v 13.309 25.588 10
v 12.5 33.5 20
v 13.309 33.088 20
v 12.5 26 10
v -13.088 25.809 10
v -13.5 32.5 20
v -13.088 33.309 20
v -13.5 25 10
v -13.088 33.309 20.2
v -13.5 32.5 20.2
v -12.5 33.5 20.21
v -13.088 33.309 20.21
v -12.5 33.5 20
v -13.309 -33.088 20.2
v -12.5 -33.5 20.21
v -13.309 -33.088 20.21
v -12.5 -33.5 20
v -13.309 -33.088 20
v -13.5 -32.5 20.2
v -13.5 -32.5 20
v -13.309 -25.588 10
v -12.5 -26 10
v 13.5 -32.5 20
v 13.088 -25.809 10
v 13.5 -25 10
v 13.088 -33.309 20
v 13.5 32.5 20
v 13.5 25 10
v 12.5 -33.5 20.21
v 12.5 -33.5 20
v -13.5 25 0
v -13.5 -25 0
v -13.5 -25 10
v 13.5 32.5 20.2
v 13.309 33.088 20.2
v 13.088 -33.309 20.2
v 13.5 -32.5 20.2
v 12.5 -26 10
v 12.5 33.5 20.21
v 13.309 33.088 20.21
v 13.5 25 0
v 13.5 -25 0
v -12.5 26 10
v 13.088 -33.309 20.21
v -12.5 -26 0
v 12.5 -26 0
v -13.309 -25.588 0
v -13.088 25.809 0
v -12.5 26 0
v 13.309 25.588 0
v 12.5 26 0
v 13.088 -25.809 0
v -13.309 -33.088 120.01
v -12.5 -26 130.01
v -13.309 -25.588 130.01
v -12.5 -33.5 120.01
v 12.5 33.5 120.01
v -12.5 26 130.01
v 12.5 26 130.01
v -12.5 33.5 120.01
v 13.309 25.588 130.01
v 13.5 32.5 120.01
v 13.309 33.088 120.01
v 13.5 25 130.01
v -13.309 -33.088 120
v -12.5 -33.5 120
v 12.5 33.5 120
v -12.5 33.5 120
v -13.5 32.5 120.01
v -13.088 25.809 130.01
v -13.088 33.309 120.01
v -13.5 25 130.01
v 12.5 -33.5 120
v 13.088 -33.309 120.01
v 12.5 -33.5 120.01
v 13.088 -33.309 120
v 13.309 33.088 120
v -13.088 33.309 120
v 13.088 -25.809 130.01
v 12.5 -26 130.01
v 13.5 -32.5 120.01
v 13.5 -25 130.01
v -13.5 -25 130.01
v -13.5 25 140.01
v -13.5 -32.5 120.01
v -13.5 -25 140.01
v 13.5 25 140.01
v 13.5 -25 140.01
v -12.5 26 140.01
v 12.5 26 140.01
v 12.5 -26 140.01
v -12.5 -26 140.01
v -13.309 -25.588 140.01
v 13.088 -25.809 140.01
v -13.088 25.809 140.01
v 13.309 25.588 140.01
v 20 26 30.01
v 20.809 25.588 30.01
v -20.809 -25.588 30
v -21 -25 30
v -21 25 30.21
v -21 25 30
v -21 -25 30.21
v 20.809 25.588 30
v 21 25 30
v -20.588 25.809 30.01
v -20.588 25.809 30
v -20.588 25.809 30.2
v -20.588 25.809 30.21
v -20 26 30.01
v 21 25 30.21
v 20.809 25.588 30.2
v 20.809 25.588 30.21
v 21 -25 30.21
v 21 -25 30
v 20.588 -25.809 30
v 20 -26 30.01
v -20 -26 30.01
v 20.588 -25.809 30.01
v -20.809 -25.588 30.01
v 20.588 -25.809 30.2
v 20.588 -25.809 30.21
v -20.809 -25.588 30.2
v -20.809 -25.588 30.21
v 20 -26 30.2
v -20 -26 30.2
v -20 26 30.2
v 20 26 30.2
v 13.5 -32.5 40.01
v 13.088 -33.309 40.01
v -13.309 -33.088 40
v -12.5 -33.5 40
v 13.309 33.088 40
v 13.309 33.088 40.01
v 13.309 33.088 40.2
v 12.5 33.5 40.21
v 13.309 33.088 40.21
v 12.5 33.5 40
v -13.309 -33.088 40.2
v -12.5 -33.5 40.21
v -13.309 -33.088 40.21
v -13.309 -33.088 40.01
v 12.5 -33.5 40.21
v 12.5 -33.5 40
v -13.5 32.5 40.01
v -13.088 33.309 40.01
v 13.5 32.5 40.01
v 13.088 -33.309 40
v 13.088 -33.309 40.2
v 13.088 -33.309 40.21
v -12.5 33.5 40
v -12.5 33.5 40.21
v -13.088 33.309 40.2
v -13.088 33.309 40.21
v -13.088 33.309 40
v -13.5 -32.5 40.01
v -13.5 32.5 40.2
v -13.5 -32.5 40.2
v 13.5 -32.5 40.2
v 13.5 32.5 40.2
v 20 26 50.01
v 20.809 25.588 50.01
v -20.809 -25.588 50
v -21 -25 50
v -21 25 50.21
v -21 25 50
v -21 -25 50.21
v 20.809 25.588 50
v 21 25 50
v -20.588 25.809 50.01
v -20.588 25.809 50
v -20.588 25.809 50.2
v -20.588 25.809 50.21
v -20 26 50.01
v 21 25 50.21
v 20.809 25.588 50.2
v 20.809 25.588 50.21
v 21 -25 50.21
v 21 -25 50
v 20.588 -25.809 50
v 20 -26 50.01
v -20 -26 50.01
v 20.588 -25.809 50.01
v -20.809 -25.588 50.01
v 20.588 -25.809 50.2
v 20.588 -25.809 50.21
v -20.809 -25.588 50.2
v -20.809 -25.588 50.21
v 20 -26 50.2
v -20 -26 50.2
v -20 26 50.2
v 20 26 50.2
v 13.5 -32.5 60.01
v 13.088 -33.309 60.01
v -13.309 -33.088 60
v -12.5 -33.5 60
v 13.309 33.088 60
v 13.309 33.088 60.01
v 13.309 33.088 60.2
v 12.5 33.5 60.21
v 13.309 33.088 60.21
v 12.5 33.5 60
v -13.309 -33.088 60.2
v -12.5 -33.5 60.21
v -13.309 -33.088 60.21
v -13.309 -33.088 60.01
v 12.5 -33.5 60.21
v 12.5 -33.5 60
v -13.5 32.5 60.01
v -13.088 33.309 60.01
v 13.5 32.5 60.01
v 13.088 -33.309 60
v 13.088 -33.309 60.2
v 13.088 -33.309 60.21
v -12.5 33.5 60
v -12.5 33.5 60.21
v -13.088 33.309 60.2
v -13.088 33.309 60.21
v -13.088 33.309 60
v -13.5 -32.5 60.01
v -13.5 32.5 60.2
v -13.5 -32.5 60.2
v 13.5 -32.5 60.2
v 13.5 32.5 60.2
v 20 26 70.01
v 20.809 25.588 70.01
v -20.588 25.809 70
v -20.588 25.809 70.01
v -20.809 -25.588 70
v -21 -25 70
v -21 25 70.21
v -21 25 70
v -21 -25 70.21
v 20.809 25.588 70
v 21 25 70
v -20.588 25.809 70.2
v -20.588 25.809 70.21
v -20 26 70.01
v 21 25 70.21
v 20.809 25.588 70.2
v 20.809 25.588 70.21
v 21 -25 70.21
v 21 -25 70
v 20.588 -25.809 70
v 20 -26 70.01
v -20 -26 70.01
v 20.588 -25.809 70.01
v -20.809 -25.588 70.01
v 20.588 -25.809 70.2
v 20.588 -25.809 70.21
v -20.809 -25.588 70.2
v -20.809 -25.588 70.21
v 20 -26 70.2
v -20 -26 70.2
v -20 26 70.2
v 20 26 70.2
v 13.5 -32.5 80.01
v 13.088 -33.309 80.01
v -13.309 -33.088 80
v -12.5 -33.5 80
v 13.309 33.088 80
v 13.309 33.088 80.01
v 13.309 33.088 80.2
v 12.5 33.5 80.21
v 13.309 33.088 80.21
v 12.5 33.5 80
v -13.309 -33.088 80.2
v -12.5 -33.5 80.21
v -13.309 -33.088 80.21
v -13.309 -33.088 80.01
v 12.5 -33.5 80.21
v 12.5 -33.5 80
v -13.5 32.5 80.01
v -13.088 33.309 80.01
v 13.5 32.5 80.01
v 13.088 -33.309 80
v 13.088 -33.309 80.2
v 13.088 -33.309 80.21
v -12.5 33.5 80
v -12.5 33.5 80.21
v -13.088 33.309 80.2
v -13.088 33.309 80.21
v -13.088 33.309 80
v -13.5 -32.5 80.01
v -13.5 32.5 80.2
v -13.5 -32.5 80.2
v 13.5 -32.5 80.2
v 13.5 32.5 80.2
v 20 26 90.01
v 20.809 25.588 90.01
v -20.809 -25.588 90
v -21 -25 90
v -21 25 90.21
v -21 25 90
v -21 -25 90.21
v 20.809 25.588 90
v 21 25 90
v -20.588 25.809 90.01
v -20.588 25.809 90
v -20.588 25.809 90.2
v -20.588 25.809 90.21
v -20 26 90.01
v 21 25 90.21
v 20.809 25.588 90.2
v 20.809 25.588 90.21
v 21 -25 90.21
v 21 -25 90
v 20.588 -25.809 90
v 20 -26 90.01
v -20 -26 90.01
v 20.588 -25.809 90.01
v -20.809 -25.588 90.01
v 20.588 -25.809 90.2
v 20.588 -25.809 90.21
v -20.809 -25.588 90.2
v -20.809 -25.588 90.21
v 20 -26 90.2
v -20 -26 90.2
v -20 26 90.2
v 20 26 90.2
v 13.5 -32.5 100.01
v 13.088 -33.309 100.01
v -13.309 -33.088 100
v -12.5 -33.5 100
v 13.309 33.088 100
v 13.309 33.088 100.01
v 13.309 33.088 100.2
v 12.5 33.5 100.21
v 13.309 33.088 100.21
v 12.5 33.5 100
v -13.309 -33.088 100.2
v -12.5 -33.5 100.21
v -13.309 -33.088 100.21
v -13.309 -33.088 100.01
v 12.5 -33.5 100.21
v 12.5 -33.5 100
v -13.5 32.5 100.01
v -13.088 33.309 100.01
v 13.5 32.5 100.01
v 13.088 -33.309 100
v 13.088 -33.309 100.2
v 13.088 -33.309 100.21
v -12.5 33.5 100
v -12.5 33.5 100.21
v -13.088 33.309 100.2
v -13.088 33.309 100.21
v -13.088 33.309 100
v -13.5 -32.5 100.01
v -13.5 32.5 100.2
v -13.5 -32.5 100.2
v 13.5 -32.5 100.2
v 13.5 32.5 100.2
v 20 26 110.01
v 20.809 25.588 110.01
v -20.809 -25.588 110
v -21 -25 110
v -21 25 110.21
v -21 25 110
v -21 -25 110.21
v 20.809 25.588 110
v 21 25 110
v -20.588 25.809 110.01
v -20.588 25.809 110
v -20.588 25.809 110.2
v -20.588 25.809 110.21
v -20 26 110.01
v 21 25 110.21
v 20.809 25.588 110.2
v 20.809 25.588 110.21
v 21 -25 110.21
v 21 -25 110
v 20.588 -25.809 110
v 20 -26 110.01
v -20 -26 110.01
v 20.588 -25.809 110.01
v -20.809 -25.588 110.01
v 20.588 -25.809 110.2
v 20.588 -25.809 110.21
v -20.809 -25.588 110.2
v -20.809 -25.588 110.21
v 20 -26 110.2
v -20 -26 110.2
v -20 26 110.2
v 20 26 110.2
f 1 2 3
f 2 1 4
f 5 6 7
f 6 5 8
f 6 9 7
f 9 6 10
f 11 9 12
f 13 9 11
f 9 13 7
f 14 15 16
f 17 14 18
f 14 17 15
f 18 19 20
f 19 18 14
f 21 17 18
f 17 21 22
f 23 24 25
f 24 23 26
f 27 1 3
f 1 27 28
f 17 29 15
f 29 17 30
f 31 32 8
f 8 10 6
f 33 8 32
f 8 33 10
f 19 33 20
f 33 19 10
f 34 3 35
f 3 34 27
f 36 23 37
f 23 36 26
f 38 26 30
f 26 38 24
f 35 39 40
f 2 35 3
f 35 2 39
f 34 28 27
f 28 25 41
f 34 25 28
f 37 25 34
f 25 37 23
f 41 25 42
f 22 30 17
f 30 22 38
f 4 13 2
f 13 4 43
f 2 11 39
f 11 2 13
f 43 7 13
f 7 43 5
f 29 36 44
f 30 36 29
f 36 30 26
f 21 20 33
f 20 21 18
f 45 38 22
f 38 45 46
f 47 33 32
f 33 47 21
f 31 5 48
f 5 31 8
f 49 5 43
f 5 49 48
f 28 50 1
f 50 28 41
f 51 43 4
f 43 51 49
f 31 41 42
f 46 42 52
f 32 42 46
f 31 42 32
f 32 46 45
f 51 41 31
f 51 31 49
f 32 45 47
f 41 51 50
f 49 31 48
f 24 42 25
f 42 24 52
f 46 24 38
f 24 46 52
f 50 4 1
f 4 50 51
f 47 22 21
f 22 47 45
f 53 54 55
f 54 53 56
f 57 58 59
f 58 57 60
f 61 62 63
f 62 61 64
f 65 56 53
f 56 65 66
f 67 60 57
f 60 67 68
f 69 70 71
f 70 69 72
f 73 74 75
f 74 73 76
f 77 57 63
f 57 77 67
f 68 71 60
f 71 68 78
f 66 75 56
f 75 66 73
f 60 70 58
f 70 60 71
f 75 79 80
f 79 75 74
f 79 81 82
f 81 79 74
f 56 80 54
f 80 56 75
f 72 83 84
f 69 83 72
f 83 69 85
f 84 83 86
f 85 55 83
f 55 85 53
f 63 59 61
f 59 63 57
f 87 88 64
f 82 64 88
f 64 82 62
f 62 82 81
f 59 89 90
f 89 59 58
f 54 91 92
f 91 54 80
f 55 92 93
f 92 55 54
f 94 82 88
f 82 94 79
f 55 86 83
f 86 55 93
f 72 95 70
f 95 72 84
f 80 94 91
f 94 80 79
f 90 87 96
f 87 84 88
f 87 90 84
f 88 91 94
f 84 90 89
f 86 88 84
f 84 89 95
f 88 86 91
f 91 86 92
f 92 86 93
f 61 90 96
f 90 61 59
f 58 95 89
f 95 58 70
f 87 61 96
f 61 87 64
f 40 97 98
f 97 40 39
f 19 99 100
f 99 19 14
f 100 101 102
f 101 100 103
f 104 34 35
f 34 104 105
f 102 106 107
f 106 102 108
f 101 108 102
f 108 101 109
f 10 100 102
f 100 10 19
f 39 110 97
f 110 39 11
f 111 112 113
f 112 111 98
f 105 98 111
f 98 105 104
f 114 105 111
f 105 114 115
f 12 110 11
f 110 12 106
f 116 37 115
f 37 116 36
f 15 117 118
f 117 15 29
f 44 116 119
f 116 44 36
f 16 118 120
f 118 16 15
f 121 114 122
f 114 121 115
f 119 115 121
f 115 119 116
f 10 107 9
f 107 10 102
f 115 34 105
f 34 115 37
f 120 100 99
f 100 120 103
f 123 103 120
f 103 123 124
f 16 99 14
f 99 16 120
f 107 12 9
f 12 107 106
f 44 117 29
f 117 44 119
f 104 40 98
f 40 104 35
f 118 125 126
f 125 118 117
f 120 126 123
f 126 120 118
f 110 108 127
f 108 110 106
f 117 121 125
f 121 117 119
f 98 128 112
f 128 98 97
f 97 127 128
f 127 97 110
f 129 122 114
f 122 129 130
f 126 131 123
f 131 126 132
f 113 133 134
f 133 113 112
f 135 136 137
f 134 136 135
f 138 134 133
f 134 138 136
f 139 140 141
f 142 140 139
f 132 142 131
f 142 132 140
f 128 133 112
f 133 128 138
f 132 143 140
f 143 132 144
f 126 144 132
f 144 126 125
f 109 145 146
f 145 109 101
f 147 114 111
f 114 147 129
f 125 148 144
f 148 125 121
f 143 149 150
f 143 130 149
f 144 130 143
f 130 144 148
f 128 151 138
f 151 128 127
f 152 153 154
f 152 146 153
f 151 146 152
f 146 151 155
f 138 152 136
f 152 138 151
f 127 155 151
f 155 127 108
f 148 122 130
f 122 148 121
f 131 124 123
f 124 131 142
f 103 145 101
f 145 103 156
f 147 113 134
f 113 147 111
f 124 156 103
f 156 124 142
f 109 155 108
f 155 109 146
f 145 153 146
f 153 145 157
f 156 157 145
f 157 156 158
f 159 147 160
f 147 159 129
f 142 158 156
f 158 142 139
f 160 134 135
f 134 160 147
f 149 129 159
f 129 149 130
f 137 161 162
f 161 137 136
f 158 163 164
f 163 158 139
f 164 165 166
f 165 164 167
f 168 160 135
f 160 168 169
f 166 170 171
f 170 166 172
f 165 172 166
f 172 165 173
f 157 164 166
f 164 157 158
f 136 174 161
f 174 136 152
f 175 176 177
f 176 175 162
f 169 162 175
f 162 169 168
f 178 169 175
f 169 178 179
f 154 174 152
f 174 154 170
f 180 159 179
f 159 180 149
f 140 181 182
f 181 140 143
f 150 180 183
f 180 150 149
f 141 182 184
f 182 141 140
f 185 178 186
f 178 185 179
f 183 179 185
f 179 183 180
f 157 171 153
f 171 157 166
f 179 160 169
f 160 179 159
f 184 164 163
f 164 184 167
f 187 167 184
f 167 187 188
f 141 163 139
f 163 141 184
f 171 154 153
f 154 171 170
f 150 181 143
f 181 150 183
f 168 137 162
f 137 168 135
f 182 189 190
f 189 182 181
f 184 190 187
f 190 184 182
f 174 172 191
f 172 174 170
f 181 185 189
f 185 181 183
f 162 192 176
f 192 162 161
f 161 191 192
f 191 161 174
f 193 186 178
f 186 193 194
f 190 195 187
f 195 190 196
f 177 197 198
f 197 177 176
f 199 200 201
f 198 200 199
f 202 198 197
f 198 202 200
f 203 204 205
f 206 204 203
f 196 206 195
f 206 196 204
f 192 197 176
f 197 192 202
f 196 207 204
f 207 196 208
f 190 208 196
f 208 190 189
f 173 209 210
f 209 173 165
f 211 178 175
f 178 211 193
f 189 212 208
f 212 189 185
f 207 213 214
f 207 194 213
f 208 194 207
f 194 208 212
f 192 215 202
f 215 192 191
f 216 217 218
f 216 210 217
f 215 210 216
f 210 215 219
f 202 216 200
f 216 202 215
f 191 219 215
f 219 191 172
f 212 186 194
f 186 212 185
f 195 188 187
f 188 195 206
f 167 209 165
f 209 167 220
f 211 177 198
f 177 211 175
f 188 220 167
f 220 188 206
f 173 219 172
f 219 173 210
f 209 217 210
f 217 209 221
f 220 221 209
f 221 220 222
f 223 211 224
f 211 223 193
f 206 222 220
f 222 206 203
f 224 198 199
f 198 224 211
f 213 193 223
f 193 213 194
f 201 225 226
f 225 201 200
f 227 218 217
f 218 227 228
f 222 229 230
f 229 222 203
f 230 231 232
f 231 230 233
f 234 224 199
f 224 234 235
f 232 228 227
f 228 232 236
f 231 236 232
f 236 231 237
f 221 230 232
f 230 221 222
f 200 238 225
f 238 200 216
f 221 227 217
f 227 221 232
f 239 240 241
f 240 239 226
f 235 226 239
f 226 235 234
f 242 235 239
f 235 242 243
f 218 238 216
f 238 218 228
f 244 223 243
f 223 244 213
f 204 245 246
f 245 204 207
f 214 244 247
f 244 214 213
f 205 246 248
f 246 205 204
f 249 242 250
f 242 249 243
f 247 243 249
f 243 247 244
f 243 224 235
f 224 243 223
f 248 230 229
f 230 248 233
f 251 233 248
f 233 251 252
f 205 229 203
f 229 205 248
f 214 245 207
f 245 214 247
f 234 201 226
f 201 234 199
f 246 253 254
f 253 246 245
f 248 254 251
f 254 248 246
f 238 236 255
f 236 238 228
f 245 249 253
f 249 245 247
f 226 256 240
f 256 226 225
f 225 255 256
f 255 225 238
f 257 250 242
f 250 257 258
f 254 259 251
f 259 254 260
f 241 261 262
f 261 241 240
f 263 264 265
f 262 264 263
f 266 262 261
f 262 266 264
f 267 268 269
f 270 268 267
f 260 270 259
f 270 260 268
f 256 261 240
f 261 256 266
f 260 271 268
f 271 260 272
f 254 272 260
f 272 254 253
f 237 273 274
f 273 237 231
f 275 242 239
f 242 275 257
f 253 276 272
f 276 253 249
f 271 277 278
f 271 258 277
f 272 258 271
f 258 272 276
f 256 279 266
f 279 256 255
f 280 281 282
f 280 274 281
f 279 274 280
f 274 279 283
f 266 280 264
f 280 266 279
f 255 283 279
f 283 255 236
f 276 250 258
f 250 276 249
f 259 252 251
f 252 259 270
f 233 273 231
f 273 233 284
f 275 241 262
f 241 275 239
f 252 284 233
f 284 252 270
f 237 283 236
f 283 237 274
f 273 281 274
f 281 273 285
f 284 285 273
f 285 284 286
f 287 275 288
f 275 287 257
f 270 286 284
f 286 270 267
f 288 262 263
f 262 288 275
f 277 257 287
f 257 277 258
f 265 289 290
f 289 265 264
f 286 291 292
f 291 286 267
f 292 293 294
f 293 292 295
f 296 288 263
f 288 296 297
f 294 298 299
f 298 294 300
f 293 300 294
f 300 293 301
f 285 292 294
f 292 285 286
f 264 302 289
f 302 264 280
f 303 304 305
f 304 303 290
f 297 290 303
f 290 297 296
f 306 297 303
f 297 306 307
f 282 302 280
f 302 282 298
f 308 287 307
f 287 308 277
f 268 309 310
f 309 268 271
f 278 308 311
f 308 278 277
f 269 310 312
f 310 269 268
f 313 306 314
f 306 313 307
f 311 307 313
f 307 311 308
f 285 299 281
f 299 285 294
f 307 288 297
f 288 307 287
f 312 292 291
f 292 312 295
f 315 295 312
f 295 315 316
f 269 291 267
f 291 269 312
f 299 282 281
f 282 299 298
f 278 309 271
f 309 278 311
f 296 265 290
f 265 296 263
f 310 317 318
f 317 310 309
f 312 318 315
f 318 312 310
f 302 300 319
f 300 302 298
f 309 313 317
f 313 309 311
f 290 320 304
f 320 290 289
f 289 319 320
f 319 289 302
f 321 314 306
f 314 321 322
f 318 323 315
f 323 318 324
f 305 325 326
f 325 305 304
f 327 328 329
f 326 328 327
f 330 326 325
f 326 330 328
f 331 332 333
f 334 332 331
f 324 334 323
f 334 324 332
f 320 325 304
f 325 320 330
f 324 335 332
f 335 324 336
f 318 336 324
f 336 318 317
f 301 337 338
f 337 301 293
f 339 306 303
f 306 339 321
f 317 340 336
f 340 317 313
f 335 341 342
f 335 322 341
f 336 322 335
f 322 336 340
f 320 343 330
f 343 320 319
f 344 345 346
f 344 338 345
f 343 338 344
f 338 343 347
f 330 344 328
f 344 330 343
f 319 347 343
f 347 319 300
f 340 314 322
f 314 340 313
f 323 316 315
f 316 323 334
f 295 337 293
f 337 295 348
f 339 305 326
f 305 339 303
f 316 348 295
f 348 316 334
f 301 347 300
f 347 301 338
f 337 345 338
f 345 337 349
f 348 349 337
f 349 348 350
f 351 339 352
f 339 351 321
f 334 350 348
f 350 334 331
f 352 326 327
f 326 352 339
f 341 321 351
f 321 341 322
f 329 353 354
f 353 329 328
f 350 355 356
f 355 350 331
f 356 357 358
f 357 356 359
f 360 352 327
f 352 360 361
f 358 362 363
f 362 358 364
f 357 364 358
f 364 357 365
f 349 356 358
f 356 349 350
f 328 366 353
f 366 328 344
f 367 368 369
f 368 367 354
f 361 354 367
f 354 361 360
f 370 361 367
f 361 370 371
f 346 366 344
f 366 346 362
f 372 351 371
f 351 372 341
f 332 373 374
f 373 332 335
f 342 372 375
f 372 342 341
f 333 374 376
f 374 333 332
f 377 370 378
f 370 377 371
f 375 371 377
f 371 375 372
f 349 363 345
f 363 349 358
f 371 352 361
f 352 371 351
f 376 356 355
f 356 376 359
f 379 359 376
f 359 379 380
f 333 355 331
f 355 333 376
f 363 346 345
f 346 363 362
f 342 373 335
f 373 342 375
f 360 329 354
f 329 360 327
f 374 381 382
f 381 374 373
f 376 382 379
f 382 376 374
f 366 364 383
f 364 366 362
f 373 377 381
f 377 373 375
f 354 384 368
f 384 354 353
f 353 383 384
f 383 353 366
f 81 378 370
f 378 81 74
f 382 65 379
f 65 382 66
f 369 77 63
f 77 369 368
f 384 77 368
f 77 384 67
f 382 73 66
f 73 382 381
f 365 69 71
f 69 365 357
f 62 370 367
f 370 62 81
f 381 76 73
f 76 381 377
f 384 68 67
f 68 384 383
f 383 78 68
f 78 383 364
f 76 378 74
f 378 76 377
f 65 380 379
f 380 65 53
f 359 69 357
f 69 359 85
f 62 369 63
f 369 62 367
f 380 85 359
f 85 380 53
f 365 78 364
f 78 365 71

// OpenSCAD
x = 25;
y = 50;
approx_z = 100;
steps = 10;
step = round(approx_z  / steps);
z=step*steps;
step2 = floor(step * 2);
ext = 1.5;
radi = 1;
verticalsegment = 0.2;
sleeve = 20;
sleeve_ext = 0;
sleeveext = sleeve*sleeve_ext;
sleeves();
body();
module sleeves() {
  hull() {
    translate([0, 0, verticalsegment+  sleeve]) plane(x, y, 0);
    translate([0, 0,   sleeve]) plane(x, y, 0);
    translate([0, 0, sleeve- min(step,sleeve*0.5)]) sleeve(x, y);
  }
  hull() {
    translate([0, 0, sleeve- min(step,sleeve*0.5)]) sleeve(x, y);
    translate([0, 0, 0]) sleeve(x, y);
  }

  hull() {
    translate([0, 0, sleeve]) plane(x, y, z);
    translate([0, 0, z + sleeve + min(step,sleeve*0.5)]) sleeve(x, y);
  }
  hull() {
    translate([0, 0, z + sleeve + sleeve]) sleeve(x, y);
    translate([0, 0, z + sleeve + min(step,sleeve*0.5)]) sleeve(x, y);
  }
}
module body() {
  for (i = [0: step: z - step]) {
    hull() {
      translate([0, 0, verticalsegment + sleeve]) plane(x, y, i);
      translate([0, 0, sleeve]) plane(x, y, i);
    }
    hull() {
      translate([0, 0, verticalsegment + sleeve]) plane(x, y, i);
      translate([0, 0, sleeve]) plane(x, y, i + step);
    }
  }
}
module plane(x, y, z) {
  translate([0, 0, z]) linear_extrude(0.01) offset(r = radi, $fn = 10) square([x + (z % step2) * ext, y + ((z + step) % step2) * ext], center = true);
}
module sleeve(x, y) {
  translate([0, 0, 0]) linear_extrude(0.01) offset(r = radi, $fn = 10) square([x + sleeveext * 2, y + sleeveext * 2], center = true);}

function rnd(a=0,b=1)=(rands(min(a,b),max(a,b),1)[0]);
